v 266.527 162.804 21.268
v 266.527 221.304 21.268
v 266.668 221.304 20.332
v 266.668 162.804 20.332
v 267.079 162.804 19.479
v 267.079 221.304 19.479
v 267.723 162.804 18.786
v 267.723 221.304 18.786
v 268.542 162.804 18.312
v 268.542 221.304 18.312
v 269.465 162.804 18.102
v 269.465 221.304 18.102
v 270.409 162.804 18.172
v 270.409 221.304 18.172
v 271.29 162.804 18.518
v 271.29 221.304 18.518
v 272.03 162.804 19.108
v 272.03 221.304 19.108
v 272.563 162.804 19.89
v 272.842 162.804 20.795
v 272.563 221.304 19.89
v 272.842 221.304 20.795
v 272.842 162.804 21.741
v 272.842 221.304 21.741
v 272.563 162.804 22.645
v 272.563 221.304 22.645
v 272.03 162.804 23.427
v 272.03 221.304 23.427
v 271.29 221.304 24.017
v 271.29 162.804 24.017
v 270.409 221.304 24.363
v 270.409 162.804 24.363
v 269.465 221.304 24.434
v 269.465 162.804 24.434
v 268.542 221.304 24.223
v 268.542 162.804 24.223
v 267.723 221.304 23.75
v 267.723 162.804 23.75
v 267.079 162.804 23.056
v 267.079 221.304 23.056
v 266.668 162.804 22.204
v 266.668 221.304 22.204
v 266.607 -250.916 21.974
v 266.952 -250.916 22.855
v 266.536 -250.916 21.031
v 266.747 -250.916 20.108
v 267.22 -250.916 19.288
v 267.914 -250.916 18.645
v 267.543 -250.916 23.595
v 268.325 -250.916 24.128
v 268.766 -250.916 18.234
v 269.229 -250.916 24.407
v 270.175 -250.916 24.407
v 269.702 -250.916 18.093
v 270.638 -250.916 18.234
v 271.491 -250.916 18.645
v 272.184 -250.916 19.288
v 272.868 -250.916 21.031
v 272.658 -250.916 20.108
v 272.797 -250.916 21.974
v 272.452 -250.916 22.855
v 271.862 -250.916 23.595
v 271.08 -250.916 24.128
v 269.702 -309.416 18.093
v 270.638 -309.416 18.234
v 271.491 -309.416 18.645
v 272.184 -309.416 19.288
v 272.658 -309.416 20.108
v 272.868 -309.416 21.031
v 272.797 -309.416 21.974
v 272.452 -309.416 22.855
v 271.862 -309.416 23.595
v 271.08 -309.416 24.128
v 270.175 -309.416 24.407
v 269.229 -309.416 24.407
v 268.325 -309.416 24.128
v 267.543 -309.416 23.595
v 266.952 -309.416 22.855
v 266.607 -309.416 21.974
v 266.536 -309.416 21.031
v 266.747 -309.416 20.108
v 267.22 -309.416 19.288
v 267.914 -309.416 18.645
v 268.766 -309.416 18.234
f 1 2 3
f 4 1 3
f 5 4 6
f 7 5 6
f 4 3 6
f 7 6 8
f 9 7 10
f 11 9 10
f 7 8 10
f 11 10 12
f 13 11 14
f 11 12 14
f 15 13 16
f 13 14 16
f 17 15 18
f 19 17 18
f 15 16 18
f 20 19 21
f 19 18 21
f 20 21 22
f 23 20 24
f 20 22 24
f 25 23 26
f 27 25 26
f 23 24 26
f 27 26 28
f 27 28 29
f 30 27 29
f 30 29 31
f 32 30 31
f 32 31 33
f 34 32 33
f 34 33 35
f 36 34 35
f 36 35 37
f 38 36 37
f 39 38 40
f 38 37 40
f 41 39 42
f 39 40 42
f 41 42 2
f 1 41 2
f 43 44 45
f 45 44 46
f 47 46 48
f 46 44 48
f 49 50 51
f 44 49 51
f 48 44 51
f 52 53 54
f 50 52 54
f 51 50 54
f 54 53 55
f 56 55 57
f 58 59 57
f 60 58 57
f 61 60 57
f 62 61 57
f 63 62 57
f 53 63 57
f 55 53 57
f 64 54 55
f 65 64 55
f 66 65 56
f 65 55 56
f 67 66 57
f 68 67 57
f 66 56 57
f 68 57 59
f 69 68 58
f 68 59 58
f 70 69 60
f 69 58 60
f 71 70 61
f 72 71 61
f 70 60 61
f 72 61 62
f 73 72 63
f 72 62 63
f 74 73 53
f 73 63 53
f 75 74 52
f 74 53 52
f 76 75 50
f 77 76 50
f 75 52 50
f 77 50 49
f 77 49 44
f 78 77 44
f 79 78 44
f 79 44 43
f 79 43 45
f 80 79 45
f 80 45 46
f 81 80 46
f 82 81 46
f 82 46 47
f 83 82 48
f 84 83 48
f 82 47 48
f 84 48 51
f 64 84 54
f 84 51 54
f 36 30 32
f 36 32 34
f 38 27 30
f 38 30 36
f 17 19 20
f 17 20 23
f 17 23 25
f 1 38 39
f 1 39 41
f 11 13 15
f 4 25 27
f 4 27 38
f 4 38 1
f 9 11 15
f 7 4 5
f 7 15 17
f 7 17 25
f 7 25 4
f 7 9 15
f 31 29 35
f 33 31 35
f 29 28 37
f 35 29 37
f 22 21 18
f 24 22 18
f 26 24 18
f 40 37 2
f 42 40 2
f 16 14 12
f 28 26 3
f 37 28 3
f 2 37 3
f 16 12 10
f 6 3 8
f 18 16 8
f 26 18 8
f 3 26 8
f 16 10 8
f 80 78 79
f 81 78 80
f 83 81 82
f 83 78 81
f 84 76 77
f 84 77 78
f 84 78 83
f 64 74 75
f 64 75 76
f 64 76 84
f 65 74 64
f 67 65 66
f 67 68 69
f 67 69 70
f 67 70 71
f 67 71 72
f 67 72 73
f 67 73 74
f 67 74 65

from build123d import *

# Parameters (mm, degrees)
BOSS_EXTRUDE1_OUTLINE_R = 3.175
BOSS_EXTRUDE1_DEPTH     = 58.499950175
SKETCH1_R               = 3.175
BOSS_EXTRUDE2_DEPTH     = 58.499950175


# Read off the part's stored shape, not the designer's step: Boss-Extrude1
with BuildPart() as part:
    # Boss-Extrude1 outline → Boss-Extrude1 (new body)
    with BuildSketch(Plane(origin=(0, 221.304262336, 0), x_dir=(-1, 0, 0), z_dir=(0, -1, 0))):
        with Locations((-269.702081562, -21.267819308)):
            Circle(BOSS_EXTRUDE1_OUTLINE_R)
    extrude(amount=BOSS_EXTRUDE1_DEPTH)


with BuildPart() as body_2:
    # Sketch1 → Boss-Extrude2 (new body)
    with BuildSketch(Plane(origin=(0, -250.916087489, 0), x_dir=(-1, 0, 0), z_dir=(0, -1, 0))):
        with Locations(Location((-269.702081562, -21.267819308, 0), (0, 0, 90))):
            Circle(SKETCH1_R)
    extrude(amount=BOSS_EXTRUDE2_DEPTH)


solid = Compound([part.part, body_2.part])
